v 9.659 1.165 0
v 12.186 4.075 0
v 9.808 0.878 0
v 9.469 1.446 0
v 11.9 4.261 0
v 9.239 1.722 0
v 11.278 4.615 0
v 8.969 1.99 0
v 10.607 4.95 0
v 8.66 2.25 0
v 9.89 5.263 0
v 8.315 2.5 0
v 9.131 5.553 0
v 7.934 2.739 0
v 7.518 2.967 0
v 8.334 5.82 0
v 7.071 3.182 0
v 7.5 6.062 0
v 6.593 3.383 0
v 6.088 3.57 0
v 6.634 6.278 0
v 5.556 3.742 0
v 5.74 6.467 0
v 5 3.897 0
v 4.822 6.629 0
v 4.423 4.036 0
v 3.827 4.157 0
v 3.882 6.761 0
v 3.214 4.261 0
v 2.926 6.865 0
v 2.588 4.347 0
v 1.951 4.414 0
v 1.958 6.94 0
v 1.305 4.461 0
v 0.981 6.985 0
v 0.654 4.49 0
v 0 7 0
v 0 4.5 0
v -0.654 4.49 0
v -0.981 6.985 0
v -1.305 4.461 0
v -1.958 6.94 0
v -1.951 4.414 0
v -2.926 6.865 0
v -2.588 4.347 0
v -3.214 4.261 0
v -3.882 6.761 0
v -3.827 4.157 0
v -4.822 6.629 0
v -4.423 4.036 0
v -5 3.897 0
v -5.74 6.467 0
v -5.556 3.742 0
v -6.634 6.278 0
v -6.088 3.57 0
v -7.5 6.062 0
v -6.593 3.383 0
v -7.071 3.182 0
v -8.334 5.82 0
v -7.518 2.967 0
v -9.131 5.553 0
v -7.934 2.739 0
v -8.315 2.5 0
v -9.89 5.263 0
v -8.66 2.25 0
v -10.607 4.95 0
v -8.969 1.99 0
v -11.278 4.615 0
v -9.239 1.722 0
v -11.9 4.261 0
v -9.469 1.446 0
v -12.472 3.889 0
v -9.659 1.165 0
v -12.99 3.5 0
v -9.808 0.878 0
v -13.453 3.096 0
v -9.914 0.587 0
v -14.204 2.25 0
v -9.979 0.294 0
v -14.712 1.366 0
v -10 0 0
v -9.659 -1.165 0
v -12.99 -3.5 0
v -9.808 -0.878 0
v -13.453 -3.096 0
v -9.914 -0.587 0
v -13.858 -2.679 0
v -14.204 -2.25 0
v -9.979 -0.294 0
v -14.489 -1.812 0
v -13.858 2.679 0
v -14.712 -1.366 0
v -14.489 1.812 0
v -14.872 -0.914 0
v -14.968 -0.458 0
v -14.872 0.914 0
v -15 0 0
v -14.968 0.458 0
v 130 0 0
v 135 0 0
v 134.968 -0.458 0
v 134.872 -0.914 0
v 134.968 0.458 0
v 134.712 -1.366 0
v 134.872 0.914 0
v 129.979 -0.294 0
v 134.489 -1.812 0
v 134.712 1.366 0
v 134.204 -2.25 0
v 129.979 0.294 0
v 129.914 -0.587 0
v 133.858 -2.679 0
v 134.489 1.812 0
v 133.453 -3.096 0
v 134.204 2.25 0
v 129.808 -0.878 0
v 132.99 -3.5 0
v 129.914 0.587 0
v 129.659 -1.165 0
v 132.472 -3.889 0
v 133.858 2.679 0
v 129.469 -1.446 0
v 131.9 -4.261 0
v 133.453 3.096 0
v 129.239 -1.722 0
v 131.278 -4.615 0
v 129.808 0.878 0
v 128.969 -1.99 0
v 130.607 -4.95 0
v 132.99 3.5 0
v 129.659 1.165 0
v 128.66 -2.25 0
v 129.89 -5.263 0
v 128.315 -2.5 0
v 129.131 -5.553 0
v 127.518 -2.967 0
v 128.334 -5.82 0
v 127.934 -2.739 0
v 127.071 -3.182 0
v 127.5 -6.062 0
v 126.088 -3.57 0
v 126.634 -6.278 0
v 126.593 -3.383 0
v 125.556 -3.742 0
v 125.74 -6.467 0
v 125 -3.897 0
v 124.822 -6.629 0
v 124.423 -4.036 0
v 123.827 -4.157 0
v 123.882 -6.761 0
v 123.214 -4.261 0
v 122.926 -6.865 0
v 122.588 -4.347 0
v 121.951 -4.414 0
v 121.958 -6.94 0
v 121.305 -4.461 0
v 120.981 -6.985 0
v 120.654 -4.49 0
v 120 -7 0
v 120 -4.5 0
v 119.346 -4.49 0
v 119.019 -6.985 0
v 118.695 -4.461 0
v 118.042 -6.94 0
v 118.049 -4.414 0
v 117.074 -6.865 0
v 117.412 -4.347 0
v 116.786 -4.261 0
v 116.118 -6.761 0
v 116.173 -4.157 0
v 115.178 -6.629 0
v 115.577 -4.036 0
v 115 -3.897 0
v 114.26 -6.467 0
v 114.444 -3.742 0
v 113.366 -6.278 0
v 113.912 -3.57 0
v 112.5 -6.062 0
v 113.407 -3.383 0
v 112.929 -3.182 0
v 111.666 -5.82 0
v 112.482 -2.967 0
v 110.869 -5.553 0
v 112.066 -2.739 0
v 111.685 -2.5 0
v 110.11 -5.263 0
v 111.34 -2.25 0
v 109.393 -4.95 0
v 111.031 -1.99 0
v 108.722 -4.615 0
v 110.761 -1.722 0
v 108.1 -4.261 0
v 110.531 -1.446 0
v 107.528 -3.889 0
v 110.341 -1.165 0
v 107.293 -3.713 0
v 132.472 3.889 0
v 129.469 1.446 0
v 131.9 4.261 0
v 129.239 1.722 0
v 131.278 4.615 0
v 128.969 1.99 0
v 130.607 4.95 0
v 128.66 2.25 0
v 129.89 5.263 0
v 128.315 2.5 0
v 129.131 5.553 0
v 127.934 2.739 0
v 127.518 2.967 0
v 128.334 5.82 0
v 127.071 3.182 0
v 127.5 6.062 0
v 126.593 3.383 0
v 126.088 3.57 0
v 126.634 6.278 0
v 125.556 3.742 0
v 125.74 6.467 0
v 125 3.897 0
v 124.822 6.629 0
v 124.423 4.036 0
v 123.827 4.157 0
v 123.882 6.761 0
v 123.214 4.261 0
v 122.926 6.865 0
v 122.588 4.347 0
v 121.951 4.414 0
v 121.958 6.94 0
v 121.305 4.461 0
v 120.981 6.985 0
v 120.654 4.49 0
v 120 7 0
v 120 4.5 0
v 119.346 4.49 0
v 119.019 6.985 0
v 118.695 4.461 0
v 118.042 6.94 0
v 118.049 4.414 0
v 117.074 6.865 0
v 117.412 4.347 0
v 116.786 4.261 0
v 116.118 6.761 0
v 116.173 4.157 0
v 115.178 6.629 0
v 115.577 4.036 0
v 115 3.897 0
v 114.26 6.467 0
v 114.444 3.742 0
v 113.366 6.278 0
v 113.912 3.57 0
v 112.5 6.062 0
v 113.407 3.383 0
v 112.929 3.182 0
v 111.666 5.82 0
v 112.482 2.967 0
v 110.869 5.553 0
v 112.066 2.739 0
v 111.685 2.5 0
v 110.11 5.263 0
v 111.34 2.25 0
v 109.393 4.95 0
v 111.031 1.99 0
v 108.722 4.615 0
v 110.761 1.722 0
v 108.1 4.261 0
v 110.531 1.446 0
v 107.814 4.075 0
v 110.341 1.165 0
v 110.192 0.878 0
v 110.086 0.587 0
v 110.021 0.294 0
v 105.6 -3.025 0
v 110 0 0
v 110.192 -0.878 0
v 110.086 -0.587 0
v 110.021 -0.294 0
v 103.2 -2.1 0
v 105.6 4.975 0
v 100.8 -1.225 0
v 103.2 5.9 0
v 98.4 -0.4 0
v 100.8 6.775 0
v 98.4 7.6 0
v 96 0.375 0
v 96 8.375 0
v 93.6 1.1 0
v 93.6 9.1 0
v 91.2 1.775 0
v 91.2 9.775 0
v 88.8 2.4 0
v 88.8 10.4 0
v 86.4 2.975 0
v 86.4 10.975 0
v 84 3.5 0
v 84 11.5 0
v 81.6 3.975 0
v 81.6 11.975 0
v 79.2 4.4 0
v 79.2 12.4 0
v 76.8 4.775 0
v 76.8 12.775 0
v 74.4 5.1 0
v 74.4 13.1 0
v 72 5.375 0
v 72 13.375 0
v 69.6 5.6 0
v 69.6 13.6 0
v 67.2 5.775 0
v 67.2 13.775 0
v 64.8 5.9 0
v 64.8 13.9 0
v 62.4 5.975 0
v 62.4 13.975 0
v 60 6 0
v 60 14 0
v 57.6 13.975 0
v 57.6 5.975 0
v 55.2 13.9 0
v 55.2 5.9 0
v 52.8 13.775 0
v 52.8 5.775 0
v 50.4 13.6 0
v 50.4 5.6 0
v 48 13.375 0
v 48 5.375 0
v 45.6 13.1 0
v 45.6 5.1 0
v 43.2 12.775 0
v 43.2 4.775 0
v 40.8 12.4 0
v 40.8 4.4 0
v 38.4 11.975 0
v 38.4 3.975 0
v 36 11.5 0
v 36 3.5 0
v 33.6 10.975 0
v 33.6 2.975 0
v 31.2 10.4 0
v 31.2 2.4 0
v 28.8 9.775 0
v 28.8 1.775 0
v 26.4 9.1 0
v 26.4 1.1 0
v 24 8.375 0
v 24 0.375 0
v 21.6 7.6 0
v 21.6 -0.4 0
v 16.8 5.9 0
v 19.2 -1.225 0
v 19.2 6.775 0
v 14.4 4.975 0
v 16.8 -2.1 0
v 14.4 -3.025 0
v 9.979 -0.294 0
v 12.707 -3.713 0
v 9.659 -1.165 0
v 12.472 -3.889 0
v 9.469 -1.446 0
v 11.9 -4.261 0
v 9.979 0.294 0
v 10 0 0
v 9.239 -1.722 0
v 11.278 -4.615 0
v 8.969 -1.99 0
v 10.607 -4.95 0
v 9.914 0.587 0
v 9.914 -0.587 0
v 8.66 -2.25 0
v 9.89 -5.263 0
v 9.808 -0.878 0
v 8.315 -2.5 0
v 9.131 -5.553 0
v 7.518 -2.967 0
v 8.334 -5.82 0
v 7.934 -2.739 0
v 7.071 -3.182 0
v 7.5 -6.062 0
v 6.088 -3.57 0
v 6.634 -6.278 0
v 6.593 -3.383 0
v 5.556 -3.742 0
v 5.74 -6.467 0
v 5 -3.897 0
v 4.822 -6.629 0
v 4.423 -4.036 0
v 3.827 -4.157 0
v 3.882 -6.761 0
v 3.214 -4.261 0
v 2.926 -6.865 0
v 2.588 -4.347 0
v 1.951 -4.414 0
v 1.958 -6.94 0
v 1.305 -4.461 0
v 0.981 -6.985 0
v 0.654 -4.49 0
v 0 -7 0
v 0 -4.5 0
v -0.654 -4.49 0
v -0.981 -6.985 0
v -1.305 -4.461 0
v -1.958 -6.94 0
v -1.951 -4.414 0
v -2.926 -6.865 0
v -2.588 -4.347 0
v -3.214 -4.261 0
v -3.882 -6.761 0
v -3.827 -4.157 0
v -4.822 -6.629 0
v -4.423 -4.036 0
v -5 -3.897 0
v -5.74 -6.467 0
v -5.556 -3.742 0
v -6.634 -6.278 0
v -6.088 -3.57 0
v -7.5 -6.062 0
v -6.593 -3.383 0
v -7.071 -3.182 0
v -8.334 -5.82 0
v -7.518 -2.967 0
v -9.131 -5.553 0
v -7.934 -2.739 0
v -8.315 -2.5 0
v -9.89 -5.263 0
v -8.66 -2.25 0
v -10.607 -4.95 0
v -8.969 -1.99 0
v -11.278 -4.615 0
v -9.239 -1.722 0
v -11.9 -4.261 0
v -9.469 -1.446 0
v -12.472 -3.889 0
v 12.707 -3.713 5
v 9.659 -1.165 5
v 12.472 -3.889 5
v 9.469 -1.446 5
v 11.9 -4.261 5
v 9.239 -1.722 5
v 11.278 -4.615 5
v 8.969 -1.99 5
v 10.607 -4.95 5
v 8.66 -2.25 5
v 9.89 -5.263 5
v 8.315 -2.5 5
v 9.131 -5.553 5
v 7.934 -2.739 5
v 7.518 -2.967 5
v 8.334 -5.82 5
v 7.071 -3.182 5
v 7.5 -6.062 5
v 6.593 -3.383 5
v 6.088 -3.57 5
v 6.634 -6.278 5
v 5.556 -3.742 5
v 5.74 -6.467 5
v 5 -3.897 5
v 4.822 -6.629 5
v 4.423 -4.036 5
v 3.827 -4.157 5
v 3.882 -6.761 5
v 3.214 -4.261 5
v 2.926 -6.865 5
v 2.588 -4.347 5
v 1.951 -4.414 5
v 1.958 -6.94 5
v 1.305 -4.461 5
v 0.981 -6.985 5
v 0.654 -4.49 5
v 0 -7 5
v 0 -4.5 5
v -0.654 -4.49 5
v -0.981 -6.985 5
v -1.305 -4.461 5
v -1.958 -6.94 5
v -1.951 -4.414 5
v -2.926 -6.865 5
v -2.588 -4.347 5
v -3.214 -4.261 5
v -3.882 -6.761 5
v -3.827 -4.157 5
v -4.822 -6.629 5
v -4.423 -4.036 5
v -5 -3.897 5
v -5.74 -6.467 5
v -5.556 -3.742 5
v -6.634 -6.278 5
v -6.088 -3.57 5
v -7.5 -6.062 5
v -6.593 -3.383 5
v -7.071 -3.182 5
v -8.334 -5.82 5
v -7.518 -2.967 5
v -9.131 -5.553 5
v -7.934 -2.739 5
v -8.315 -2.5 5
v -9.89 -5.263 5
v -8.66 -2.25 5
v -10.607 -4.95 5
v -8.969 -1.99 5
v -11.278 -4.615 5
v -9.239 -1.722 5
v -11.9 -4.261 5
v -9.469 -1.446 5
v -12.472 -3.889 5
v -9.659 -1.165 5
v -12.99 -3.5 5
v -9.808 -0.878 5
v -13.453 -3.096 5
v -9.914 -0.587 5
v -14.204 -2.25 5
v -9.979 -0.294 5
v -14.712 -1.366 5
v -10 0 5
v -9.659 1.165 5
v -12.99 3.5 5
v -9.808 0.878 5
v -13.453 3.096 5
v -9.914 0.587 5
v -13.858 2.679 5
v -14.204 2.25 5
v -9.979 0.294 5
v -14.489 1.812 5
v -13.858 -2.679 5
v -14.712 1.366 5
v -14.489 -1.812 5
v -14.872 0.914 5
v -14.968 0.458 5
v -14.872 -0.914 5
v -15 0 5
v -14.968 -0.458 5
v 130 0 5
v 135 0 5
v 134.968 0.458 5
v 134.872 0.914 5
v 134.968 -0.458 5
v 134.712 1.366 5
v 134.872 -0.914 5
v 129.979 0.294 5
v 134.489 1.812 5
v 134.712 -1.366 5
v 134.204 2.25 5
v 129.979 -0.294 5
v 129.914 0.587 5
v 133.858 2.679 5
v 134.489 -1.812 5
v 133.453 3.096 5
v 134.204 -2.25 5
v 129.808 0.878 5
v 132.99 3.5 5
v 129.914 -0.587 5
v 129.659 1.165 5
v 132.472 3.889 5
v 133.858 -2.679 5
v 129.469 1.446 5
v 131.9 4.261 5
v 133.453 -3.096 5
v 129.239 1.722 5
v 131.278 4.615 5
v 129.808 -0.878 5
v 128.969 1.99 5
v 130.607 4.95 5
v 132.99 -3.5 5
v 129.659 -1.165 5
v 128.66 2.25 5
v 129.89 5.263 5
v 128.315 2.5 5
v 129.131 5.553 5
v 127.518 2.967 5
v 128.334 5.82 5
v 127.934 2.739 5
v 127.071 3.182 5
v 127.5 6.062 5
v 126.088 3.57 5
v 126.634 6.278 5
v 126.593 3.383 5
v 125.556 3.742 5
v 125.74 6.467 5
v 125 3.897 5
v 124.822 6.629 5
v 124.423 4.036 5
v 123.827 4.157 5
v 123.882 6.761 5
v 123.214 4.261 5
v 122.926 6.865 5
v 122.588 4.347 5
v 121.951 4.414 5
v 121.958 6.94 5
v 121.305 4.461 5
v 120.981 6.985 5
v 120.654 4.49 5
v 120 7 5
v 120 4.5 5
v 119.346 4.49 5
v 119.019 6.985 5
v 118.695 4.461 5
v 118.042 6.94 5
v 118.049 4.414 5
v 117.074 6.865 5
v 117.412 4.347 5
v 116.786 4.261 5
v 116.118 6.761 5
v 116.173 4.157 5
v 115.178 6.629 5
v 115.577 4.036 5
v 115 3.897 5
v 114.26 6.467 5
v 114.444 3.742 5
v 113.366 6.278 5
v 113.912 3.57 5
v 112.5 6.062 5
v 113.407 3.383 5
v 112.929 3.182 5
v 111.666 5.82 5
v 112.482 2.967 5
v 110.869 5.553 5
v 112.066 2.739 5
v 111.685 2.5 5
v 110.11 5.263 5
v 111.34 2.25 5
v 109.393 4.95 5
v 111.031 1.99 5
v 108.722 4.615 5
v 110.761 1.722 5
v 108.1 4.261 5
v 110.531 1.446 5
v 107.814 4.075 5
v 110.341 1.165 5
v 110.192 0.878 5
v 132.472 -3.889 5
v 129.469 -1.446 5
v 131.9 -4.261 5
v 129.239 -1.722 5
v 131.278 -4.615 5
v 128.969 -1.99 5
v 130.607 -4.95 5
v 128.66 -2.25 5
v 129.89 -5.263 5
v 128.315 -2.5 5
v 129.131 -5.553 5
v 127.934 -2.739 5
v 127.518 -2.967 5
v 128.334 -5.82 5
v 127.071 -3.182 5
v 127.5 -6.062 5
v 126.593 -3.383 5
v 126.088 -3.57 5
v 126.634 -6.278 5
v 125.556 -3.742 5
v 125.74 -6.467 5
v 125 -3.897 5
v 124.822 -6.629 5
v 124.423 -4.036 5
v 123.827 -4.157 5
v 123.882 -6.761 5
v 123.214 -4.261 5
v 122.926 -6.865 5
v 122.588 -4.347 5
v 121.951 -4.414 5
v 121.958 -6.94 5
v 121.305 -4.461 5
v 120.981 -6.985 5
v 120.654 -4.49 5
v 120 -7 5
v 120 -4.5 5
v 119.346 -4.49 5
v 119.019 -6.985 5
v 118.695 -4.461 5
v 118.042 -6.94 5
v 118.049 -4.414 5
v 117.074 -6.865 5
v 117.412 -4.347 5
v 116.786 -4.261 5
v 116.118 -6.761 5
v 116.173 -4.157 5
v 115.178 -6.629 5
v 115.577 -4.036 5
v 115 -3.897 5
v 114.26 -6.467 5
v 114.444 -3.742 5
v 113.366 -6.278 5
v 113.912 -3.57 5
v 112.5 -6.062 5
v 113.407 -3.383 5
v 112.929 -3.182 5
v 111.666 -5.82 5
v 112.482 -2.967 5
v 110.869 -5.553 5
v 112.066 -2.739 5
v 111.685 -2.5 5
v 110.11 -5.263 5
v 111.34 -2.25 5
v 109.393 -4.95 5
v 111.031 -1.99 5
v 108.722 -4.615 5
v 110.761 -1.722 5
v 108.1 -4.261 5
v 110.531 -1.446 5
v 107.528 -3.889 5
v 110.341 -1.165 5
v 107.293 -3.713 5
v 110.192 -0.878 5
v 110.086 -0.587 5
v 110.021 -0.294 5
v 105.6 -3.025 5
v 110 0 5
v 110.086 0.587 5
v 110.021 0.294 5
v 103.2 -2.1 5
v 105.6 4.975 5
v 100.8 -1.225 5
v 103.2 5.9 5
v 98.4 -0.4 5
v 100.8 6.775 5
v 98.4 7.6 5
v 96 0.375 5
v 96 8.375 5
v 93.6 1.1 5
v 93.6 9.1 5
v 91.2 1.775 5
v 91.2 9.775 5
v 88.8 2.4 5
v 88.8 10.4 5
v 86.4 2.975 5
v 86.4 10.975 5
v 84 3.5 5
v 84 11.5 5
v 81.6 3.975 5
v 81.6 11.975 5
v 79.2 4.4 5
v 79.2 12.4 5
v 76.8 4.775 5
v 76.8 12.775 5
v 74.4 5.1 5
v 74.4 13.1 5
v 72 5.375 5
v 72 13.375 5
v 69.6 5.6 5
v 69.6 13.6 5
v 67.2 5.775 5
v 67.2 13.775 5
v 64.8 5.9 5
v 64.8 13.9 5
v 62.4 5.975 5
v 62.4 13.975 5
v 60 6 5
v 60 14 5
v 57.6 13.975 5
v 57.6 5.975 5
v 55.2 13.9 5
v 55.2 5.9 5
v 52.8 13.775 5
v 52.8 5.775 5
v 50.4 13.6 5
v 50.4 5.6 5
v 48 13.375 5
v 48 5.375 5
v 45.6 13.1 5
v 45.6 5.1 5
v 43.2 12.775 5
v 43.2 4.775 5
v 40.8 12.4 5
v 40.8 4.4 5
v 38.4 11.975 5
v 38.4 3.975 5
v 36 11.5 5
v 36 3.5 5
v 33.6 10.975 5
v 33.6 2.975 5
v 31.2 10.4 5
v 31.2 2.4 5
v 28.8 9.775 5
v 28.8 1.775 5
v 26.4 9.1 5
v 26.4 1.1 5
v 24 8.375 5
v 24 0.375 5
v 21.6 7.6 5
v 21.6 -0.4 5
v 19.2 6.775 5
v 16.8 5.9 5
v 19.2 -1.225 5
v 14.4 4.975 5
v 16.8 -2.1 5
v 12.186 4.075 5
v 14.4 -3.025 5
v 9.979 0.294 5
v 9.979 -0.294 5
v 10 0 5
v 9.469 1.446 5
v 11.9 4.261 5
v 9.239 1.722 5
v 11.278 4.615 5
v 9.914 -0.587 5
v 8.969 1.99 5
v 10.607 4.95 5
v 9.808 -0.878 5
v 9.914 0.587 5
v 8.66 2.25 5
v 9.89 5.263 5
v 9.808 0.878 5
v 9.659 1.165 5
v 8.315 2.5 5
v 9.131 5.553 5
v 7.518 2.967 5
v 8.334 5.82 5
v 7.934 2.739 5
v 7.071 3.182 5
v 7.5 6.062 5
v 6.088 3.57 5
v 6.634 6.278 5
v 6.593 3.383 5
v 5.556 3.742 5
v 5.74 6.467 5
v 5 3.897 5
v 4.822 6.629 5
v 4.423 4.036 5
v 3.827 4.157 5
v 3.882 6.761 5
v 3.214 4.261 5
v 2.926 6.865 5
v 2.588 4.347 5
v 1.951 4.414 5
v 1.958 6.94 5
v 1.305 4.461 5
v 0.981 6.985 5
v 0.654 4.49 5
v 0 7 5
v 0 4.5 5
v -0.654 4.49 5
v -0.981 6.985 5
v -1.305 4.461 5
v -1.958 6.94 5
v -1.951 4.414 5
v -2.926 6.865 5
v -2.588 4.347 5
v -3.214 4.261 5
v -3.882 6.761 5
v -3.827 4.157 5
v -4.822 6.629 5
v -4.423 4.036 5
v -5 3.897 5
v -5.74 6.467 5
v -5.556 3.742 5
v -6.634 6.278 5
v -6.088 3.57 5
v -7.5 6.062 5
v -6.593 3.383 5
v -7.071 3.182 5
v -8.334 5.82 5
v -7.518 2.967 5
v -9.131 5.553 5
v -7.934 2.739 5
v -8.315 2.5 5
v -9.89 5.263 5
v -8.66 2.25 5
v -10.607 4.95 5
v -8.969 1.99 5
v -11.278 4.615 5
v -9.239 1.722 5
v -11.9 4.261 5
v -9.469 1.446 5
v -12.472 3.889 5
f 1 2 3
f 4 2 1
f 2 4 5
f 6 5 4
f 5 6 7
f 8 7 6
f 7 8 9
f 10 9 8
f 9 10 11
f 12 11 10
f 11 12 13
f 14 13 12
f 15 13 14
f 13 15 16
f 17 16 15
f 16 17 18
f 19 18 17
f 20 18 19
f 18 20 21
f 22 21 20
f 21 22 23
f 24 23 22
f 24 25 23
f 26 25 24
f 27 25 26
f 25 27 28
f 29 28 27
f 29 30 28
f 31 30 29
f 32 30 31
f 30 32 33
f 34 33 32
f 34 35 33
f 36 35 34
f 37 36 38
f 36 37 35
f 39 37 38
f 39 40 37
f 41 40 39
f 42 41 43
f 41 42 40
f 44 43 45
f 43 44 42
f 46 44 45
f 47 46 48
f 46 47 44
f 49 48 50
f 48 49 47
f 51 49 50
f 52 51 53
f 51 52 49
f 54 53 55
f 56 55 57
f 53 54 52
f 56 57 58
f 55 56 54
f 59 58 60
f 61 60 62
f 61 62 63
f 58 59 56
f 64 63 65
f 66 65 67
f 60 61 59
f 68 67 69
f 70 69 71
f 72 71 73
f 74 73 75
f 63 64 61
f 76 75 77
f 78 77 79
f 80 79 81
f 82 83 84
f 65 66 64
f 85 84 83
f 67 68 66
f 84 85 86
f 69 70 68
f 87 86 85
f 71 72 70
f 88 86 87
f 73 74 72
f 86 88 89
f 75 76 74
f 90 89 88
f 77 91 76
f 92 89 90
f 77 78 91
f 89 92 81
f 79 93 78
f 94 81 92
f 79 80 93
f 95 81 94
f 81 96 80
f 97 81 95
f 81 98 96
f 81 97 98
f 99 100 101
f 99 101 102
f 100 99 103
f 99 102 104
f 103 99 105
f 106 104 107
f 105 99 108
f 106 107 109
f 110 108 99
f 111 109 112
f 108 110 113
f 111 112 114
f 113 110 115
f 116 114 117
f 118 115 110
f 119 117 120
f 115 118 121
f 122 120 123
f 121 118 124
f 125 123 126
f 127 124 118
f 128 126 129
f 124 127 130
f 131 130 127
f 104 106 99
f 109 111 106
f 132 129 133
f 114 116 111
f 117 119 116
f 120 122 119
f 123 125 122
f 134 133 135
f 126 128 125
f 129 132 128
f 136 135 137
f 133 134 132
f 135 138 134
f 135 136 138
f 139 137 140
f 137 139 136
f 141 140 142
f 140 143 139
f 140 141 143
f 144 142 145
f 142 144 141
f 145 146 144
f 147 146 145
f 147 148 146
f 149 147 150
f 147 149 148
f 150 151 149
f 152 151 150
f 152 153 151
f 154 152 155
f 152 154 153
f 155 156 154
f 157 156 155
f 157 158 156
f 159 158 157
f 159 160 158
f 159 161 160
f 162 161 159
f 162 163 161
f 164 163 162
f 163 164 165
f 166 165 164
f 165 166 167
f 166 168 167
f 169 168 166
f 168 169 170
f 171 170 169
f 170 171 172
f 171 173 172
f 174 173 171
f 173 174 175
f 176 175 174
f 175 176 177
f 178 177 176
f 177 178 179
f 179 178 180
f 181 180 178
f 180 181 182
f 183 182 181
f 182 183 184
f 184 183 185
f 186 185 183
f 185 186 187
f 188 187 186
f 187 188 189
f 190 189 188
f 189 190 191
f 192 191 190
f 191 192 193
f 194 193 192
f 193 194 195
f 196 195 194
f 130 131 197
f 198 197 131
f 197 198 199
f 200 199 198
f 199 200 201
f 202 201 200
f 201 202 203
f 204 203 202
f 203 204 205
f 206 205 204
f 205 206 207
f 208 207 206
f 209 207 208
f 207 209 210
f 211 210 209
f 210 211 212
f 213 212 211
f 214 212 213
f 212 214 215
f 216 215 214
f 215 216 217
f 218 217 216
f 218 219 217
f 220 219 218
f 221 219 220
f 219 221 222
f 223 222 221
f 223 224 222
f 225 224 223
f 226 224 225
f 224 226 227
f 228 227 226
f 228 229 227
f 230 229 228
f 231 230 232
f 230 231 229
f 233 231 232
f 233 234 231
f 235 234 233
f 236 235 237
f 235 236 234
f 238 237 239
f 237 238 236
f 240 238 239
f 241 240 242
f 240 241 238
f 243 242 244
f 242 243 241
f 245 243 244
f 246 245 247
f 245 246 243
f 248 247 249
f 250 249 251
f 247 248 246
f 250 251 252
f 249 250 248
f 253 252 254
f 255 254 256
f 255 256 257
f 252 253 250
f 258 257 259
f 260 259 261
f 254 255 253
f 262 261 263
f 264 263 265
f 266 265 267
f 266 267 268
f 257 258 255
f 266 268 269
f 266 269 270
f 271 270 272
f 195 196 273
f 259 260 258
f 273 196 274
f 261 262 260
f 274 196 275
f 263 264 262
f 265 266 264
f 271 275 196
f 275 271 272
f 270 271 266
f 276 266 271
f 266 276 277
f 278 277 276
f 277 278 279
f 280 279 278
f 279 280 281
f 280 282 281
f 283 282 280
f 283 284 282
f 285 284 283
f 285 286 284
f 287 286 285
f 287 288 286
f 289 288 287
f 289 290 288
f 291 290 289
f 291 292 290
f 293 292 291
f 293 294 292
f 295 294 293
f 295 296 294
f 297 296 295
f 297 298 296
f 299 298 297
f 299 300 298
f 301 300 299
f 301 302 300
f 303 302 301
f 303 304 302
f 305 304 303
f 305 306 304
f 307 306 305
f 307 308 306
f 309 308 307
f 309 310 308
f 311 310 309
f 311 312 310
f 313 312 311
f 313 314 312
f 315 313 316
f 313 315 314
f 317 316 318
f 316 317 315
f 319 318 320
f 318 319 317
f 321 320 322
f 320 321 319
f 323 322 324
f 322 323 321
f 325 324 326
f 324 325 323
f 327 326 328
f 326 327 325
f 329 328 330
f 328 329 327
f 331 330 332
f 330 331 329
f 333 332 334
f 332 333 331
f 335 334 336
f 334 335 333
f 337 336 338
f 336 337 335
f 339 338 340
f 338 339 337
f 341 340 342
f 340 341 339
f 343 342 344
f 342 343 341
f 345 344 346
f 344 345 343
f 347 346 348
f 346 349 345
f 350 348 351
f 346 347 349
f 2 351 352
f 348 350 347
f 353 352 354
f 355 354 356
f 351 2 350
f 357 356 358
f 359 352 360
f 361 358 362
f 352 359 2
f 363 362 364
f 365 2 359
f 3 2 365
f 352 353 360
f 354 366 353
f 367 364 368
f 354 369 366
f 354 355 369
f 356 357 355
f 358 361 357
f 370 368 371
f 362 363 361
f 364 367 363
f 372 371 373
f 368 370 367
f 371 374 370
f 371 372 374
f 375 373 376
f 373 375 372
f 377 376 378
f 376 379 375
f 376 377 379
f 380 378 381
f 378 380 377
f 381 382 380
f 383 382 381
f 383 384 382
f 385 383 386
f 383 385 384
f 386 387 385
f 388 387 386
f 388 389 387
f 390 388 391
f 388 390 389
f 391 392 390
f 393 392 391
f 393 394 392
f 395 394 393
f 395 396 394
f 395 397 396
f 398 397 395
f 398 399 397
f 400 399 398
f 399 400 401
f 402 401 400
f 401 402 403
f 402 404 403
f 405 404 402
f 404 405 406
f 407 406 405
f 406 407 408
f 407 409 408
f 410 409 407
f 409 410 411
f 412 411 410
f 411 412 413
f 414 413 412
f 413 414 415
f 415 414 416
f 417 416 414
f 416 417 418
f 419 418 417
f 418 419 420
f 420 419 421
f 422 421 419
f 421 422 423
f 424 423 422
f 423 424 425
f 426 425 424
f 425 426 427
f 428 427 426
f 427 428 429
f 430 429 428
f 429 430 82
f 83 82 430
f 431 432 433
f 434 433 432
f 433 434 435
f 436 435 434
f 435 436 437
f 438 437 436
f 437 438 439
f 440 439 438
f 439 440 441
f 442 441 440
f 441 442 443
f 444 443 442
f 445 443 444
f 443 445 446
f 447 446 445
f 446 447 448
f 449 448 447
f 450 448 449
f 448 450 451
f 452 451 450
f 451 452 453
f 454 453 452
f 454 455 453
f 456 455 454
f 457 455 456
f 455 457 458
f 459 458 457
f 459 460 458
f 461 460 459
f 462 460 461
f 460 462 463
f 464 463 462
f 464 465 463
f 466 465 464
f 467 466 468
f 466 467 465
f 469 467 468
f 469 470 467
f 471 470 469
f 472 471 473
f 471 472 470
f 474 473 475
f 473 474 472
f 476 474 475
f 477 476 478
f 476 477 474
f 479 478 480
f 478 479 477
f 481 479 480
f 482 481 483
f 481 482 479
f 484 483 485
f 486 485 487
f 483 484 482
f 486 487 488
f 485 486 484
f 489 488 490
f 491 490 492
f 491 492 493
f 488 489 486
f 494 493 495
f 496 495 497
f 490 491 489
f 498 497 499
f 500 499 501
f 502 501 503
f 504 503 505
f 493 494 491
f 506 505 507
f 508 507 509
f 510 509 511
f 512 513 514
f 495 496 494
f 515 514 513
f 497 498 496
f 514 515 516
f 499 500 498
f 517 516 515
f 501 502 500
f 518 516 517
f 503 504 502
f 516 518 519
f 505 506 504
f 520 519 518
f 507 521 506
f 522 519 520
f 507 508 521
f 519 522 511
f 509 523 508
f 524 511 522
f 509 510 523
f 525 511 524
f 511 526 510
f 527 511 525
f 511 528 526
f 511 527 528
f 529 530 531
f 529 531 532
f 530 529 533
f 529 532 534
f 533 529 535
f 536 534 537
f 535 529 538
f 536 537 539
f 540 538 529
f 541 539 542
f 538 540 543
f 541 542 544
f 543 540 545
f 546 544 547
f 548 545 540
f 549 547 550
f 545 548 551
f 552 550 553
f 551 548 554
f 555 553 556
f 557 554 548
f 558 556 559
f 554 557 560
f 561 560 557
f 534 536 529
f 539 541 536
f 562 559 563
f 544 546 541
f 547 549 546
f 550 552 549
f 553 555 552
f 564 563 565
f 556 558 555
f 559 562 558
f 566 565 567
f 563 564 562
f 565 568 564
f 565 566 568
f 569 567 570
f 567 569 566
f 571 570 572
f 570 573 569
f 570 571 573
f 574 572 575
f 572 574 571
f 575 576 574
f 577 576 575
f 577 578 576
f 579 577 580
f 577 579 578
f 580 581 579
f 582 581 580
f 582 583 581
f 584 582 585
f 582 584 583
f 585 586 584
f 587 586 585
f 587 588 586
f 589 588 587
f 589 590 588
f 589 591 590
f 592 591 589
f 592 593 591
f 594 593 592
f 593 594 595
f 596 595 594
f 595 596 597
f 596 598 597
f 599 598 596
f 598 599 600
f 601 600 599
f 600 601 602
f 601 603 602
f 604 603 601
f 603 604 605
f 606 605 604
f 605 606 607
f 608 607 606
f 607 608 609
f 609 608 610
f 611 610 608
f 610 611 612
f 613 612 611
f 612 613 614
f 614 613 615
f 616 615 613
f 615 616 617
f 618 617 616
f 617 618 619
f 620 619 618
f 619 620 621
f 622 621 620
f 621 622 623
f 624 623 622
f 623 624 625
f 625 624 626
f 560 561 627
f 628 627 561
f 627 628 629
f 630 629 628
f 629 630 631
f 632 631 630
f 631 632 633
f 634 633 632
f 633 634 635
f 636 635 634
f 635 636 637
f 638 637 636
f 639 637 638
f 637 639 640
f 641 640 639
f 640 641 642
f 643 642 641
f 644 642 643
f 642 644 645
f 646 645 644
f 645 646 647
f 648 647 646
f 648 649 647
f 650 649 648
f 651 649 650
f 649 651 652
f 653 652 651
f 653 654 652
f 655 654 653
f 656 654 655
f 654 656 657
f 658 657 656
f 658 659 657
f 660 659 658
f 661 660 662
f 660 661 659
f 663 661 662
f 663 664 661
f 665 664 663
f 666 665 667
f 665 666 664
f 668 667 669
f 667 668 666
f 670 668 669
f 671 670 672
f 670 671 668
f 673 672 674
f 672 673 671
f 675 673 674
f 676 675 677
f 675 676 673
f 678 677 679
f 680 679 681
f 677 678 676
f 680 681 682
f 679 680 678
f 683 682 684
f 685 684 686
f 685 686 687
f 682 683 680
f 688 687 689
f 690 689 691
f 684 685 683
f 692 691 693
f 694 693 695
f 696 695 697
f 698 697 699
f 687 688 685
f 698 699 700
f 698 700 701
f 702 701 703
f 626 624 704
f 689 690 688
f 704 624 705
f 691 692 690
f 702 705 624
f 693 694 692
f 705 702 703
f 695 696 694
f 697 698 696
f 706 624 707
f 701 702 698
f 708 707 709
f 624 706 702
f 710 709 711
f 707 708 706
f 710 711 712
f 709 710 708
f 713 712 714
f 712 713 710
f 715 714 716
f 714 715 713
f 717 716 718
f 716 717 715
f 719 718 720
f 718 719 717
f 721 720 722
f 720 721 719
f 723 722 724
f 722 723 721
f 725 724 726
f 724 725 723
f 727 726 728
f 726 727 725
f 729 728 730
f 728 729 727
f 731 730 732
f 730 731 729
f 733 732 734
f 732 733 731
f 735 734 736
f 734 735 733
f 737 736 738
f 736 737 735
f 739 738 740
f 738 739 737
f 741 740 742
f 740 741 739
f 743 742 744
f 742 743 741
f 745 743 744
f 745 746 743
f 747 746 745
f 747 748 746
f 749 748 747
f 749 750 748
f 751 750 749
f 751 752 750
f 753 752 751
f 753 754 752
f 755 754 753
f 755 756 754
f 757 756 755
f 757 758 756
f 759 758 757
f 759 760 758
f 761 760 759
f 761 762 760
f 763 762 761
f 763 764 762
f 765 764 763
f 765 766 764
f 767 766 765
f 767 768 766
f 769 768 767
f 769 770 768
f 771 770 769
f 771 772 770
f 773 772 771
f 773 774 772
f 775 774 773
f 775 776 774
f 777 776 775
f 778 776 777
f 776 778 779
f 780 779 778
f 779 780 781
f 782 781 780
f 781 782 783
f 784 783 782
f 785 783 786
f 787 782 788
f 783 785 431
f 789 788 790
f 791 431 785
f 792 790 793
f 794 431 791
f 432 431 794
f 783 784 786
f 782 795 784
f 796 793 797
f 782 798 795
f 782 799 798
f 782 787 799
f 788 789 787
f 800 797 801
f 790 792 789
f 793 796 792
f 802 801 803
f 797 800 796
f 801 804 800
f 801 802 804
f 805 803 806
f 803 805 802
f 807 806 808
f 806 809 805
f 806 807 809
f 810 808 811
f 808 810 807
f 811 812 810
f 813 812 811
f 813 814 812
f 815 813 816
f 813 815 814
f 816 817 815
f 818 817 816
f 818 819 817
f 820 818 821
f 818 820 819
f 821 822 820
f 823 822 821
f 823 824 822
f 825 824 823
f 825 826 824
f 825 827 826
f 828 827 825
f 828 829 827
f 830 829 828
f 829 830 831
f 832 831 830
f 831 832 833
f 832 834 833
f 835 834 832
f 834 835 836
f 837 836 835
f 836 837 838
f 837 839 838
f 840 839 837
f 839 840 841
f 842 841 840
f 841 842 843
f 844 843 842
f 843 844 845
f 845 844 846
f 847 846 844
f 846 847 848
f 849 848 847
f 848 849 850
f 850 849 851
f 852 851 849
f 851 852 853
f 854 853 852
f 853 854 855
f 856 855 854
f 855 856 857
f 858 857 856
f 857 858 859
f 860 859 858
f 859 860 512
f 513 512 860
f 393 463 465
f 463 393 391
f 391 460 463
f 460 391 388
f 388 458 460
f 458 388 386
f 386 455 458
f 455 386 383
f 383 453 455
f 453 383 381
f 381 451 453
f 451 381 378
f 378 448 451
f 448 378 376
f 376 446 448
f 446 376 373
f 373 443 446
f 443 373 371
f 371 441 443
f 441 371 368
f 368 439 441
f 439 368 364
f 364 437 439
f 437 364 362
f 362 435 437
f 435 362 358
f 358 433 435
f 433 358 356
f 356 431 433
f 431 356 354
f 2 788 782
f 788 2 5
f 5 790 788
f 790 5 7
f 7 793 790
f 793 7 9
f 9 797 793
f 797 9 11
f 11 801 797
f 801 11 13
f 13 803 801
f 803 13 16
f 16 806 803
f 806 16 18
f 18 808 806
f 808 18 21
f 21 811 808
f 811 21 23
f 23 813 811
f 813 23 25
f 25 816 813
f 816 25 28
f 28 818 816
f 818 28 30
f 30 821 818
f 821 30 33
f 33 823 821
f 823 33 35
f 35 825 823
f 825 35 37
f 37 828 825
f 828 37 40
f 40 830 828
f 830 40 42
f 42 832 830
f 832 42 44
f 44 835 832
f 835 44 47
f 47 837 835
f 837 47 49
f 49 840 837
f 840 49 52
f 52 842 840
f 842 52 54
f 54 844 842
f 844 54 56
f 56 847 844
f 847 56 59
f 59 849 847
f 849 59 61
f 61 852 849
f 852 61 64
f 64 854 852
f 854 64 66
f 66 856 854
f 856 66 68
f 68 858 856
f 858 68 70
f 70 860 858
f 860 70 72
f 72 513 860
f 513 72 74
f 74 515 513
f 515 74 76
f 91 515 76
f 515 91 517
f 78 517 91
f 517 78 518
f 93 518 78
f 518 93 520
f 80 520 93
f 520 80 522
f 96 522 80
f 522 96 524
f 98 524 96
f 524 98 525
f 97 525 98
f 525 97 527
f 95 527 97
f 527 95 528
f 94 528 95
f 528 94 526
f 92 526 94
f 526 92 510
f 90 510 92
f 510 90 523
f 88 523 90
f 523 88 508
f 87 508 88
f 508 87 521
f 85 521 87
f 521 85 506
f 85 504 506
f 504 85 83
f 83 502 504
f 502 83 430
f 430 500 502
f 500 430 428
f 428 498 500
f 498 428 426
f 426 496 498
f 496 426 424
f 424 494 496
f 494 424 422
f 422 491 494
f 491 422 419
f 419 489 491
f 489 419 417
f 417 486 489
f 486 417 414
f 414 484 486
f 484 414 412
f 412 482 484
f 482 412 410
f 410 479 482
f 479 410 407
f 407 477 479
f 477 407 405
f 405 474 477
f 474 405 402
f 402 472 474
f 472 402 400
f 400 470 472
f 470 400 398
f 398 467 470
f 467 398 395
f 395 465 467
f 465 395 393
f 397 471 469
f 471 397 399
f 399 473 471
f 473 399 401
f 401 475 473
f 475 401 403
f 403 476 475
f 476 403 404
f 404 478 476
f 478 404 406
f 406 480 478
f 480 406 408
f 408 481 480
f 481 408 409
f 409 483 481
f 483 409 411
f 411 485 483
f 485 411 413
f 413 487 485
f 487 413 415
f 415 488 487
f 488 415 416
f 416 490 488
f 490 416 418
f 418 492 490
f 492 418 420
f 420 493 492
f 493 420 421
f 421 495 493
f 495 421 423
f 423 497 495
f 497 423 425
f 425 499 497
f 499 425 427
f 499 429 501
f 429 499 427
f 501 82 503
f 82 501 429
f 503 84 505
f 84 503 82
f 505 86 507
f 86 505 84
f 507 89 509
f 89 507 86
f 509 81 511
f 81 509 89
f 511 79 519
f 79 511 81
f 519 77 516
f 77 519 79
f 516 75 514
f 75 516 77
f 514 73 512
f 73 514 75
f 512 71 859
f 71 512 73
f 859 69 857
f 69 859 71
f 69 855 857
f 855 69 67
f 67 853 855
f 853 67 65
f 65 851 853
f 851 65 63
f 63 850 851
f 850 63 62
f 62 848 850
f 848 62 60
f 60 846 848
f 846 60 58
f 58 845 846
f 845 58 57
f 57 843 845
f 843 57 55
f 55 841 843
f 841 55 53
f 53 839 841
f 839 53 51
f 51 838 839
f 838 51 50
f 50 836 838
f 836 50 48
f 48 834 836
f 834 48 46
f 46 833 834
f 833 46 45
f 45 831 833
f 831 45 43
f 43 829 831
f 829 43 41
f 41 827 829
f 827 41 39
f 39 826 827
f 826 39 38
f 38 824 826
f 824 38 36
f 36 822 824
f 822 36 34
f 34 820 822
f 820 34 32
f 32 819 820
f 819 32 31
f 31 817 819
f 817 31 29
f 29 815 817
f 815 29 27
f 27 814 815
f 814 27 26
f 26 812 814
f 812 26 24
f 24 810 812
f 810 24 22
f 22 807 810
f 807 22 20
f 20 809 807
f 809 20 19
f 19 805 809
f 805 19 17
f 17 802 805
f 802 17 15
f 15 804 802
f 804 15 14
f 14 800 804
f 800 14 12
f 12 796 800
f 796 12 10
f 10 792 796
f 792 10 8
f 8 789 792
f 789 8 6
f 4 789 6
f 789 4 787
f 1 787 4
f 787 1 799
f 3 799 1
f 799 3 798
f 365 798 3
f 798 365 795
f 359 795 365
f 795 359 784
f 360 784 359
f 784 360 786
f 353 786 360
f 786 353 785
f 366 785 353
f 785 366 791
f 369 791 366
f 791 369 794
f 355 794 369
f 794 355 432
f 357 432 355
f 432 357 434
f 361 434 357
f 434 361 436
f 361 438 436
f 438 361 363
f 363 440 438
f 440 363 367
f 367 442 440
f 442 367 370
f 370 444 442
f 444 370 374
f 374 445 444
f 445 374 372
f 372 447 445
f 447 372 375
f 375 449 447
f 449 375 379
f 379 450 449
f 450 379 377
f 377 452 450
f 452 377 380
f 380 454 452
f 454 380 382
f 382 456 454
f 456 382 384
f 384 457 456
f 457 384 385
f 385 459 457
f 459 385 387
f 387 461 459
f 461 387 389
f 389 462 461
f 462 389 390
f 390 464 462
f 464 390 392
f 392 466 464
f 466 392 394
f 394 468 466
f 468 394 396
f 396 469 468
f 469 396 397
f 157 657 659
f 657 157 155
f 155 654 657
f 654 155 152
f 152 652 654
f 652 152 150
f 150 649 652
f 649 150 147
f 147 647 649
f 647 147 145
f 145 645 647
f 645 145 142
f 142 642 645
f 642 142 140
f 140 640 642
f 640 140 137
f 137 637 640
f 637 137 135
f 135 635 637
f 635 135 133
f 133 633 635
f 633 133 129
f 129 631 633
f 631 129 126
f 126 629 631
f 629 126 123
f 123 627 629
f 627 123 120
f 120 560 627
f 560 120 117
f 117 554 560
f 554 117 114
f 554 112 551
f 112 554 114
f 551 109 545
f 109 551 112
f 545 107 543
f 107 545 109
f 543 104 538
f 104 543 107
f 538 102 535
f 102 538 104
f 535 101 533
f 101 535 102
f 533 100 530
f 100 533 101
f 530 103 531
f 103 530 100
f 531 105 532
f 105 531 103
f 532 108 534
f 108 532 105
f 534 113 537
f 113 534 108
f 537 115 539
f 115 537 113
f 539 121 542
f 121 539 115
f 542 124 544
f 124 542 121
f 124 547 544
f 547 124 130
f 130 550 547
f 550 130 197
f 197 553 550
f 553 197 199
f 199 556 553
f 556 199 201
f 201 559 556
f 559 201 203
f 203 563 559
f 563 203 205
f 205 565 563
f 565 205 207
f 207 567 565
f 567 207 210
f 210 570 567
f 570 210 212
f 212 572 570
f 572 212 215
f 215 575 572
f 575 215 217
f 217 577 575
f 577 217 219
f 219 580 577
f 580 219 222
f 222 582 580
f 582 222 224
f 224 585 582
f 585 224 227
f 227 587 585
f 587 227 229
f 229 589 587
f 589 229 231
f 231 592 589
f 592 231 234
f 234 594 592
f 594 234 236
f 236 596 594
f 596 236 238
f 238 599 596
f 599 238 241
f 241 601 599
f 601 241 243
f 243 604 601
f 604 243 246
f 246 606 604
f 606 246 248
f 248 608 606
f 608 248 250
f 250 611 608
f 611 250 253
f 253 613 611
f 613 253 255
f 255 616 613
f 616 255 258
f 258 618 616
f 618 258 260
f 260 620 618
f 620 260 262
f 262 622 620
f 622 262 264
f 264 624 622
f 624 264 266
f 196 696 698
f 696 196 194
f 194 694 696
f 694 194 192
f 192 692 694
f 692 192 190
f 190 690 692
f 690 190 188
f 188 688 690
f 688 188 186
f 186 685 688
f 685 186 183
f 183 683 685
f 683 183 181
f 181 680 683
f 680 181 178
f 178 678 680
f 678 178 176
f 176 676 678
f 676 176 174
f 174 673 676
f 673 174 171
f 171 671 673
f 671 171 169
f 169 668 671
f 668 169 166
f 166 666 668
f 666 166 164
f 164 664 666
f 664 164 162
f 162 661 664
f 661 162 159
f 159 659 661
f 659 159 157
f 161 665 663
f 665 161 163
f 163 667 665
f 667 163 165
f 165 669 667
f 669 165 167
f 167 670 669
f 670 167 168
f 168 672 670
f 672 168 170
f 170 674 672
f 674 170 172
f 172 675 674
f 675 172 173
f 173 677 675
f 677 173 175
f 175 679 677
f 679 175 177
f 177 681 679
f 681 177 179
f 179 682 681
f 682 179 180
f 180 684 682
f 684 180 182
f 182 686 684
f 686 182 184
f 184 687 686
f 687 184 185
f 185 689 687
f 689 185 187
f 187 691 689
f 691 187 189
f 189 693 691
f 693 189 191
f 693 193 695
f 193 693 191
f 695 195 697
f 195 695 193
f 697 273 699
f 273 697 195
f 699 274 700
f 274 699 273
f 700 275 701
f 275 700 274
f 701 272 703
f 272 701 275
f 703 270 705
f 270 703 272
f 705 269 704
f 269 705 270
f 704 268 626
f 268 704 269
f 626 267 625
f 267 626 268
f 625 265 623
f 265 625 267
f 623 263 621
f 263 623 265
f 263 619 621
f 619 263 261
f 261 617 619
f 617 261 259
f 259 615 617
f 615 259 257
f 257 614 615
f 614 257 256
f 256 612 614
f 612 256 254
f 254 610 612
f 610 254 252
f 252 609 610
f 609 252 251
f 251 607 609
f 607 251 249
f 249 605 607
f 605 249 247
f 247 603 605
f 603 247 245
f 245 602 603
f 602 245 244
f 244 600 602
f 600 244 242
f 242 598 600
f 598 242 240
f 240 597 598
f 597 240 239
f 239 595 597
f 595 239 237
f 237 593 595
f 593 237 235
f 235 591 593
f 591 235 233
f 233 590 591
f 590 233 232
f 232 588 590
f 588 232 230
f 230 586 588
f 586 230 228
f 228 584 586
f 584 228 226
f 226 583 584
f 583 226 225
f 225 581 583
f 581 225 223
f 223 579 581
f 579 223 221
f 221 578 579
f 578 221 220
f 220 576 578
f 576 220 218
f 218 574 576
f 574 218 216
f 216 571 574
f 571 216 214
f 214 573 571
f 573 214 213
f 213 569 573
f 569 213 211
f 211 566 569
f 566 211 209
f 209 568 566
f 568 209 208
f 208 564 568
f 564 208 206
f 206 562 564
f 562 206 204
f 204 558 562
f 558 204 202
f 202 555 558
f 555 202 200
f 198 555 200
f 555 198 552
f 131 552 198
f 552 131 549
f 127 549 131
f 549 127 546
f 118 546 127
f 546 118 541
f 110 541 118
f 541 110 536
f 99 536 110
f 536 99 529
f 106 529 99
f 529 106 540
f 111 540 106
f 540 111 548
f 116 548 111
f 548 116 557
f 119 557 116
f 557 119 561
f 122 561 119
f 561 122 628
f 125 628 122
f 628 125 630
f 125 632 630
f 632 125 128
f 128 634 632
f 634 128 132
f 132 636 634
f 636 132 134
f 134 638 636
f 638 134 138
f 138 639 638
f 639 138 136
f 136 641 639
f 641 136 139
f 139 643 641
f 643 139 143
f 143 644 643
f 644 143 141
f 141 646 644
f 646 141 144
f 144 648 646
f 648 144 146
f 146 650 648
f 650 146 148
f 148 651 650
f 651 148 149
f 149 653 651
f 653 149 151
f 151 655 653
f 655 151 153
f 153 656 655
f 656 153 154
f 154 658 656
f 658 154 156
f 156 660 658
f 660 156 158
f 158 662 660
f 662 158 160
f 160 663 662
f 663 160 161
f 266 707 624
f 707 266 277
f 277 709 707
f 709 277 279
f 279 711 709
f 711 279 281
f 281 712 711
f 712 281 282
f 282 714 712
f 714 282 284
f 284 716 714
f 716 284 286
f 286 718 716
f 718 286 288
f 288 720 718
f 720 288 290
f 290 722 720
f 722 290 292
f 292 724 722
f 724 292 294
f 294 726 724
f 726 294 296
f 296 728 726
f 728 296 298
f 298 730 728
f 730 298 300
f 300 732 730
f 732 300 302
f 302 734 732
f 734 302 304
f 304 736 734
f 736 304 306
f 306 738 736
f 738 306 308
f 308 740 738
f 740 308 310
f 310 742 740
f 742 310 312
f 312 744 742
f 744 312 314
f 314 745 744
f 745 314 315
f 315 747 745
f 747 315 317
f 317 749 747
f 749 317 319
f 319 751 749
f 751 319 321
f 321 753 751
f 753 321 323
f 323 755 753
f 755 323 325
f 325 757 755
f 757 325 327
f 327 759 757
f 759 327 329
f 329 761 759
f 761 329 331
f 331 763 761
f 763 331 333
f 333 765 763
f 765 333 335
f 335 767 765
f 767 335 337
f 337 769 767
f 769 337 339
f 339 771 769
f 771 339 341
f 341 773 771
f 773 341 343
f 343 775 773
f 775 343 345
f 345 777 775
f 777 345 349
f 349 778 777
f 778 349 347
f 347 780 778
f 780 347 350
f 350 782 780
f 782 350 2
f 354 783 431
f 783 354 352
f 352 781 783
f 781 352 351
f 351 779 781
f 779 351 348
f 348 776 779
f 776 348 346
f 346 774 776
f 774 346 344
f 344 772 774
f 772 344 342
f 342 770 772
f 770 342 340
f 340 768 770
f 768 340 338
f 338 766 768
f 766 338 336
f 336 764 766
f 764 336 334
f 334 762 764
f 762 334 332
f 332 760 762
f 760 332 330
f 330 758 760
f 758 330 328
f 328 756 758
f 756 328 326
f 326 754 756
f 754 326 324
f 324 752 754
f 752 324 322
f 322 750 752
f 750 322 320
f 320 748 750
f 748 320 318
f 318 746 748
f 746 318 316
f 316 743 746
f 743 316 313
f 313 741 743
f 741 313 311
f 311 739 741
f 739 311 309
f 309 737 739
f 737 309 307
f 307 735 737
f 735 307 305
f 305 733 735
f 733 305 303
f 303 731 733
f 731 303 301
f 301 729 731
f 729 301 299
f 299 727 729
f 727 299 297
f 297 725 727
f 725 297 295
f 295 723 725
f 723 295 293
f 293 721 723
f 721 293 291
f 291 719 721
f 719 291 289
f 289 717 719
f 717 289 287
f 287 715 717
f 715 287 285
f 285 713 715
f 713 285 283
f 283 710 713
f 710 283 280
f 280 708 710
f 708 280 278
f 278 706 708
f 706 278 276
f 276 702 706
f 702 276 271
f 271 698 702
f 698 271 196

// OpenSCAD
// Parametric support strap: two oval eyes joined by a curved body.
// Datum: centre of the left eye at (0,0), base at Z=0, thickness along +Z. Units: mm.
// All values below are example values. In a real job each value is tagged as
// MEASURED (taken from the physical part) or PLACEHOLDER (not measured yet,
// present only so the pipeline can run end to end).

total_length   = 150.0; // example, end to end
eye_outer_long = 30.0;  // example
eye_outer_short= 14.0;  // example
hole_long      = 20.0;  // example
hole_short     = 9.0;   // example
thickness      = 5.0;   // example
body_width     = 8.0;   // example
bow            = 10.0;  // example, Y offset of the body at mid-span
embed          = 3.0;   // how far the body runs into each eye wall
$fn            = 96;

centre_distance = total_length - eye_outer_long;

// Fail loudly on physically impossible input instead of rendering garbage.
assert(hole_long  < eye_outer_long,  "hole (long axis) must be smaller than the eye");
assert(hole_short < eye_outer_short, "hole (short axis) must be smaller than the eye");
assert(body_width < eye_outer_short, "body cannot be wider than the eye");
echo(centre_distance = centre_distance);

module eye(cx) {
    translate([cx, 0, 0])
    linear_extrude(height = thickness)
    difference() {
        scale([eye_outer_long / 2, eye_outer_short / 2]) circle(r = 1);
        scale([hole_long / 2, hole_short / 2]) circle(r = 1);
    }
}

// Parabolic centre line: y = 0 at both ends, y = bow at mid-span.
function yc(x, xs, xe) = bow * (1 - pow((x - (xs + xe) / 2) / ((xe - xs) / 2), 2));

module body() {
    xs = eye_outer_long / 2 - embed;
    xe = centre_distance - eye_outer_long / 2 + embed;
    n = 40;
    xl  = [for (i = [0 : n]) xs + (xe - xs) * i / n];
    top = [for (x = xl) [x, yc(x, xs, xe) + body_width / 2]];
    bot = [for (x = xl) [x, yc(x, xs, xe) - body_width / 2]];
    linear_extrude(height = thickness)
        polygon(concat(top, [for (i = [n : -1 : 0]) bot[i]]));
}

union() {
    eye(0);
    eye(centre_distance);
    body();
}
